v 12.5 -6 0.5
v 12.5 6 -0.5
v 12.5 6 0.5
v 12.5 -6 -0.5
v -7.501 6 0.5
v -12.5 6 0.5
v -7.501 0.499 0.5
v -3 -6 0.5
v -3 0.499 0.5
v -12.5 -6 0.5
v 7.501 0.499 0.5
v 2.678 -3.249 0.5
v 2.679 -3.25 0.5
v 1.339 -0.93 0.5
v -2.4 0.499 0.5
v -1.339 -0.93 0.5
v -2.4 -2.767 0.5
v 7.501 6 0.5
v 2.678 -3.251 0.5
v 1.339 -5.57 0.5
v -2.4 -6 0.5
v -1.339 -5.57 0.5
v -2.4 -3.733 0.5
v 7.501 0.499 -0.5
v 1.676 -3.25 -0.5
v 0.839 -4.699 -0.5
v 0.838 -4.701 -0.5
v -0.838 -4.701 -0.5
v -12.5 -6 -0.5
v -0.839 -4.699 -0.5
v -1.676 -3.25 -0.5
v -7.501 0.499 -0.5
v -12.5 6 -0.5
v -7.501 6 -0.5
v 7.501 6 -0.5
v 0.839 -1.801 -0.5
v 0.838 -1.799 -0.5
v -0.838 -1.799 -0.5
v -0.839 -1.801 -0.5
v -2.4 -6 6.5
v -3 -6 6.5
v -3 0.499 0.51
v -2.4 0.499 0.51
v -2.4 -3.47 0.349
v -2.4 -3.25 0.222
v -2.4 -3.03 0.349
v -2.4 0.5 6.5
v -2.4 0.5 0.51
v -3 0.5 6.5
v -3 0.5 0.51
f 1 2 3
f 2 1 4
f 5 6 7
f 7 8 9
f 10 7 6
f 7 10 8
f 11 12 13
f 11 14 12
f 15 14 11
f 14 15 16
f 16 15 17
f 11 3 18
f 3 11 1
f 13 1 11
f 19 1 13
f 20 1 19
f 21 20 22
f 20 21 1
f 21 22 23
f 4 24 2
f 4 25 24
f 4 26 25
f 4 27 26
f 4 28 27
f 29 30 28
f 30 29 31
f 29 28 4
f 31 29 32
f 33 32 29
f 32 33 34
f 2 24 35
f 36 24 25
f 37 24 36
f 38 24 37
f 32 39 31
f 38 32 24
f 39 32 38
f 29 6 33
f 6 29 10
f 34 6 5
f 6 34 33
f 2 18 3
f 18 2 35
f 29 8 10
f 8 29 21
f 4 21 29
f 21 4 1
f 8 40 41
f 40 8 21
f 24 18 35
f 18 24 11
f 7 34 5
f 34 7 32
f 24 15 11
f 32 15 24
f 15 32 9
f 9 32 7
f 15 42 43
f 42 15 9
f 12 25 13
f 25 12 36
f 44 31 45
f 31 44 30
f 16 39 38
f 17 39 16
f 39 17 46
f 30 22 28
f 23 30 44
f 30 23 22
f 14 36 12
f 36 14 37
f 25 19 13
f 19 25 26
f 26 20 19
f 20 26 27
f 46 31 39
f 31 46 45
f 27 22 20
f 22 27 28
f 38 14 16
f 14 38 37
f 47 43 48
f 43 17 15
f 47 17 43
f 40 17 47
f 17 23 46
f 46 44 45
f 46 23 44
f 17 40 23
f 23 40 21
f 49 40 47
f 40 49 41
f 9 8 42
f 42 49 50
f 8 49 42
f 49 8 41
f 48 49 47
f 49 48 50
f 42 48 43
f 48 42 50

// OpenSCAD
// How wide is your printer nozzle, for hole size correction
nozzleWidth=0.4; //[0.1,0.2,0.3,0.4,0.5,0.6]
halfNozzleWidth=nozzleWidth/2;
// How wide is your carraige
carraigeWidth=25; //[20:40]
// How deep is the carraige from front to back
carraigeDepth=12; // [4:30]
// How deep is the section where the belt goes through 0 for no belt
carraigeBeltPathDepth=5.5; 
// How wide is the cutout for the belt
carraigeBeltPathWidth=15; //[5:30]
// Where is the bolt located divide in half for the middle
carraigeMountBolt=12.5; 
// The offset for the sensor location
opticalBreakOffset=3; // [0:10]
// How thick should the break be
opticalBreakThickess=.6; //[0.1:0.9]
// How tall should the optical break be
opticalBreakHeight=7; //[4:10]
// How thick should the mounting bracket be
opticalBreakMountThickness=1; //[1:3]
// How many points the screw holes should have
circleRadiusPoints=6; //[3:30]
// The radius of the screw hole
screwHoleRadius=1.475;

module OpticalBreak(){
    beltDepthOffset = carraigeDepth - carraigeBeltPathDepth;
    halfBeltDepthOffset = beltDepthOffset / 2;
    halfOpticalBreakHeight=opticalBreakHeight/2;
    halfOpticalBreakMountThickness=opticalBreakMountThickness/2;
    holeRadius=screwHoleRadius+halfNozzleWidth;
    union() {
        
        difference() {
            cube([carraigeWidth, carraigeDepth, opticalBreakMountThickness], center=true);
            translate([0, halfBeltDepthOffset,0]) 
            cube([carraigeBeltPathWidth + 0.002, carraigeBeltPathDepth + 0.002, opticalBreakMountThickness + 0.02], center=true);
            translate([0, -halfBeltDepthOffset,0]) 
    cylinder(h = opticalBreakMountThickness + 0.002, r1 = holeRadius, r2= holeRadius * 1.6, center = true, $fn = circleRadiusPoints);
        }
        difference() {
        translate([-opticalBreakOffset + (opticalBreakThickess / 2) , -halfBeltDepthOffset + (0.5) , halfOpticalBreakHeight - (halfOpticalBreakMountThickness) ]) 
        cube([opticalBreakThickess, beltDepthOffset, opticalBreakHeight], center=true);
           translate([0, halfBeltDepthOffset,0]) 
            cube([carraigeBeltPathWidth + 0.002, carraigeBeltPathDepth + 0.002, opticalBreakMountThickness + 0.02], center=true); 
            
        }

    }
}


OpticalBreak();
//mirror([0,1,0]) 
//OpticalBreak();
